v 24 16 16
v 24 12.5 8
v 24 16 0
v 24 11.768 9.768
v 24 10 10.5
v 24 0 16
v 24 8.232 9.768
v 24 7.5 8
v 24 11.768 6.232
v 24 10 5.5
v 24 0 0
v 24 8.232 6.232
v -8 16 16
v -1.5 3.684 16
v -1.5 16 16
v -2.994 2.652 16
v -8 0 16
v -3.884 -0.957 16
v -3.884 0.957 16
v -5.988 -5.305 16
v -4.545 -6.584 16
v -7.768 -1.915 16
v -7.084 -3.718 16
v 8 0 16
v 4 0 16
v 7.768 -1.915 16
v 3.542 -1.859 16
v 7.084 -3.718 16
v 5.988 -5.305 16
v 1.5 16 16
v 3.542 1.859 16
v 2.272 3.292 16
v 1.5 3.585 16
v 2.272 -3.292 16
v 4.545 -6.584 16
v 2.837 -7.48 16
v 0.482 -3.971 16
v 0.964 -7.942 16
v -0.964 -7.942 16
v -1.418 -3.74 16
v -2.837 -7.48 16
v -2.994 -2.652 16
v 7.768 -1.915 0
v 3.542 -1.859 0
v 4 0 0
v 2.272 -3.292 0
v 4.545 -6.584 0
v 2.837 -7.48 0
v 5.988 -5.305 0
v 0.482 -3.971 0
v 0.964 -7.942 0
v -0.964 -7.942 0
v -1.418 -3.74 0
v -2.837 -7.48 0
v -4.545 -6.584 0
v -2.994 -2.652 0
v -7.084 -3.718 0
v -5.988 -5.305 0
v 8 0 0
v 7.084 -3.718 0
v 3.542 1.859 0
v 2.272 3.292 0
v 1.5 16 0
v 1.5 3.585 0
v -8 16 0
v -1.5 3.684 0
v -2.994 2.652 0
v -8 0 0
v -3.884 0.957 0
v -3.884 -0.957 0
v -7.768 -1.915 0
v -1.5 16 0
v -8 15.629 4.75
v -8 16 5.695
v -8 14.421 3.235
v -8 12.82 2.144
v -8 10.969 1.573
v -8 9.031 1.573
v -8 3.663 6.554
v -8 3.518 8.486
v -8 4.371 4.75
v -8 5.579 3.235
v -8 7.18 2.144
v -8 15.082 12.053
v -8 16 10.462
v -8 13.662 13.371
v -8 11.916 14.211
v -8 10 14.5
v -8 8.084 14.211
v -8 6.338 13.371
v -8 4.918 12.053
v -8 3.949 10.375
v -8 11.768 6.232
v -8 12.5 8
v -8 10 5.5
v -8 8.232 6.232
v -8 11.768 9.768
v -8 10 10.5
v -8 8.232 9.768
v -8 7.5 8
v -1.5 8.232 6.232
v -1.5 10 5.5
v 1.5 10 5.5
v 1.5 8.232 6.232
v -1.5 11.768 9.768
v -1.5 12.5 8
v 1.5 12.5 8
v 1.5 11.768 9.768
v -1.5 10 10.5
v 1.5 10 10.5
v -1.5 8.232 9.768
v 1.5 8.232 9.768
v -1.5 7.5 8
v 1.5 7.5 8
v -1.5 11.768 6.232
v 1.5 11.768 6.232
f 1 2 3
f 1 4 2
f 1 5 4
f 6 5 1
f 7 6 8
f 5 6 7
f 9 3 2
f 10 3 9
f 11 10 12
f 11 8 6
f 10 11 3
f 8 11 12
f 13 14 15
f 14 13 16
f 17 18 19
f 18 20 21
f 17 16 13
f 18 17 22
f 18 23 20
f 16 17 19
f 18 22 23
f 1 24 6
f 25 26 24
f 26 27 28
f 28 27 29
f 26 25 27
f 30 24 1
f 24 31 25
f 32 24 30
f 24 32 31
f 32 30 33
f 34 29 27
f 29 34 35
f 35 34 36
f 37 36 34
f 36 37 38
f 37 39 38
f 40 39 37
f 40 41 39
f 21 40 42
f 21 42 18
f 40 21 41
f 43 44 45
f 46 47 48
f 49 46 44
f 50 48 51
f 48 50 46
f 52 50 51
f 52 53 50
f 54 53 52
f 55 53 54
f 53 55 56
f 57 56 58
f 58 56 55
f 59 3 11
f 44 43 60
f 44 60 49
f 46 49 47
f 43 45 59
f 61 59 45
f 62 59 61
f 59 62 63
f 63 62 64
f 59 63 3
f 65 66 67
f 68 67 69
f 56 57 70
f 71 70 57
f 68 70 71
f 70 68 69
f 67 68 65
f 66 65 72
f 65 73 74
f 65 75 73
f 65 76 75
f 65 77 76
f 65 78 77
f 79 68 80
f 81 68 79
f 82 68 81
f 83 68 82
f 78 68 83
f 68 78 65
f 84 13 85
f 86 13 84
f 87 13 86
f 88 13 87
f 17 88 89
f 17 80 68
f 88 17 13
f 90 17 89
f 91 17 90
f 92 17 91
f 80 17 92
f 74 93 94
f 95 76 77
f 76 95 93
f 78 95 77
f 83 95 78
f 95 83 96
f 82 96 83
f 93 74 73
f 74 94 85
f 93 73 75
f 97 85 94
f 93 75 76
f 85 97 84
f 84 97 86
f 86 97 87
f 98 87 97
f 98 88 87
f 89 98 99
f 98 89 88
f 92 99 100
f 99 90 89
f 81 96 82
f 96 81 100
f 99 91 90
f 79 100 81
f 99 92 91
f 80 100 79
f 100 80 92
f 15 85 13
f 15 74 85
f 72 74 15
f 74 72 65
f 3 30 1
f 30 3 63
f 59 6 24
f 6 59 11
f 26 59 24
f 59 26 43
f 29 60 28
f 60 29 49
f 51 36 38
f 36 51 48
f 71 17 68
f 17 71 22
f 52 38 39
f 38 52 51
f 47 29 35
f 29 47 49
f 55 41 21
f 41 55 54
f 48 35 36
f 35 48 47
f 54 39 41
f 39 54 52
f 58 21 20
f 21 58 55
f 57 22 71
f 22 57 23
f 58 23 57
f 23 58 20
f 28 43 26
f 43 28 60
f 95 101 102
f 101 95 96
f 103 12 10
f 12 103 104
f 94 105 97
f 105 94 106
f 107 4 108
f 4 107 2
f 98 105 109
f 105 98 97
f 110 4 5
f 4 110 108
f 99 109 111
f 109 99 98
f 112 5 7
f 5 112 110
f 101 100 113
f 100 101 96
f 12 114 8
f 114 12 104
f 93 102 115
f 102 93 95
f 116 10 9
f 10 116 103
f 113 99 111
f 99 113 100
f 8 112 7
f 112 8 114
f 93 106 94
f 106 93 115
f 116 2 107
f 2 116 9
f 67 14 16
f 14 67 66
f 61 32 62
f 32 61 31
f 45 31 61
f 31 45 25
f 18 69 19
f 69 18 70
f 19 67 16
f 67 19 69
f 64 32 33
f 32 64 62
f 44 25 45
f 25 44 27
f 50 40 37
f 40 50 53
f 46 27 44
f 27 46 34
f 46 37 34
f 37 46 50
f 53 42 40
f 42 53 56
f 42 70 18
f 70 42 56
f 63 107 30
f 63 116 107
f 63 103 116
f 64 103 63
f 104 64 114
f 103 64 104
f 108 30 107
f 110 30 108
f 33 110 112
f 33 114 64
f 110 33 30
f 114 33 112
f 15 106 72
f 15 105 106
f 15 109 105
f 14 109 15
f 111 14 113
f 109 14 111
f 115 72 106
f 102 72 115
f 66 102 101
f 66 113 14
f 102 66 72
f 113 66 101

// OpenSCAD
// file: configuration.scad
// Copyright (C) 2012 t00tie
// Adapto is licensed under the Creative Commons - GNU GPL license.
// http://creativecommons.org/licenses/GPL/2.0/

// Configuration file for Adapto OpenSCAD files

boltOuterRadius=5/2;// outer radius of bolt threads, 5 for M5 bolts
boltLength=60;//bolt length without head (threaded part only)
washerOuterRadius=13/2;// washers that fit the bolts
washerLength=10;// this is large because it is used to make holes for washers

frameX=20;// width of frame parts (alu, wood etc.)
frameY=20;// ditto

boltOffset=frameX/2;// How far in the bolt holes go, may need tweaking if framX!=frameY

smoothRod=8;// diameter of smooth rods
// file: bolt.scad
include <configuration.scad>;

module bolt(){
	union(){
		translate([0, 0, -boltLength]) cylinder(r=boltOuterRadius, h=boltLength+1);
		cylinder(r=washerOuterRadius, h=washerLength);
	}
}

// a bolt and washer intended for making equivalent holes
// the parameter from indicates which side the bolt is inserted from
module boltWasher(from="x-"){
	if(from=="x+"){
		rotate([0, 90, 0]) bolt();
	} else
	if(from=="x-"){
		rotate([0, -90, 0]) bolt();
	} else
	if(from=="y+"){
		rotate([-90, 0, 0]) bolt();
	} else
	if(from=="y-"){
		rotate([90, 0, 0]) bolt();
	} else
	if(from=="z+"){
		rotate([0, 0, 0]) bolt();
	} else
	if(from=="z-"){
		rotate([180, 0, 0]) bolt();
	}
}

boltWasher("x-");
// main file
// Copyright (C) 2012 t00tie
// After an stl designed by RoTorIT
// Adapto is licensed under the Creative Commons - GNU GPL license.
// http://creativecommons.org/licenses/GPL/2.0/

l=32;// length
b=16;// breadth
t=4;// wall thickness

use <bolt.scad>;
include <configuration.scad>;

module xBarClamp(){
	difference(){
		union(){
			translate([-t-smoothRod/2, 0, 0]) cube([l, b, b]);
			cylinder(r=t+smoothRod/2, h=b);
		}
		cylinder(r=smoothRod/2, h=b);
		translate([-t-smoothRod/2, b-(b-smoothRod/2)/2, b/2]) boltWasher("x-");
		translate([-3/2, 0, 0]) cube([3, b, b]);
	}
}

xBarClamp();
